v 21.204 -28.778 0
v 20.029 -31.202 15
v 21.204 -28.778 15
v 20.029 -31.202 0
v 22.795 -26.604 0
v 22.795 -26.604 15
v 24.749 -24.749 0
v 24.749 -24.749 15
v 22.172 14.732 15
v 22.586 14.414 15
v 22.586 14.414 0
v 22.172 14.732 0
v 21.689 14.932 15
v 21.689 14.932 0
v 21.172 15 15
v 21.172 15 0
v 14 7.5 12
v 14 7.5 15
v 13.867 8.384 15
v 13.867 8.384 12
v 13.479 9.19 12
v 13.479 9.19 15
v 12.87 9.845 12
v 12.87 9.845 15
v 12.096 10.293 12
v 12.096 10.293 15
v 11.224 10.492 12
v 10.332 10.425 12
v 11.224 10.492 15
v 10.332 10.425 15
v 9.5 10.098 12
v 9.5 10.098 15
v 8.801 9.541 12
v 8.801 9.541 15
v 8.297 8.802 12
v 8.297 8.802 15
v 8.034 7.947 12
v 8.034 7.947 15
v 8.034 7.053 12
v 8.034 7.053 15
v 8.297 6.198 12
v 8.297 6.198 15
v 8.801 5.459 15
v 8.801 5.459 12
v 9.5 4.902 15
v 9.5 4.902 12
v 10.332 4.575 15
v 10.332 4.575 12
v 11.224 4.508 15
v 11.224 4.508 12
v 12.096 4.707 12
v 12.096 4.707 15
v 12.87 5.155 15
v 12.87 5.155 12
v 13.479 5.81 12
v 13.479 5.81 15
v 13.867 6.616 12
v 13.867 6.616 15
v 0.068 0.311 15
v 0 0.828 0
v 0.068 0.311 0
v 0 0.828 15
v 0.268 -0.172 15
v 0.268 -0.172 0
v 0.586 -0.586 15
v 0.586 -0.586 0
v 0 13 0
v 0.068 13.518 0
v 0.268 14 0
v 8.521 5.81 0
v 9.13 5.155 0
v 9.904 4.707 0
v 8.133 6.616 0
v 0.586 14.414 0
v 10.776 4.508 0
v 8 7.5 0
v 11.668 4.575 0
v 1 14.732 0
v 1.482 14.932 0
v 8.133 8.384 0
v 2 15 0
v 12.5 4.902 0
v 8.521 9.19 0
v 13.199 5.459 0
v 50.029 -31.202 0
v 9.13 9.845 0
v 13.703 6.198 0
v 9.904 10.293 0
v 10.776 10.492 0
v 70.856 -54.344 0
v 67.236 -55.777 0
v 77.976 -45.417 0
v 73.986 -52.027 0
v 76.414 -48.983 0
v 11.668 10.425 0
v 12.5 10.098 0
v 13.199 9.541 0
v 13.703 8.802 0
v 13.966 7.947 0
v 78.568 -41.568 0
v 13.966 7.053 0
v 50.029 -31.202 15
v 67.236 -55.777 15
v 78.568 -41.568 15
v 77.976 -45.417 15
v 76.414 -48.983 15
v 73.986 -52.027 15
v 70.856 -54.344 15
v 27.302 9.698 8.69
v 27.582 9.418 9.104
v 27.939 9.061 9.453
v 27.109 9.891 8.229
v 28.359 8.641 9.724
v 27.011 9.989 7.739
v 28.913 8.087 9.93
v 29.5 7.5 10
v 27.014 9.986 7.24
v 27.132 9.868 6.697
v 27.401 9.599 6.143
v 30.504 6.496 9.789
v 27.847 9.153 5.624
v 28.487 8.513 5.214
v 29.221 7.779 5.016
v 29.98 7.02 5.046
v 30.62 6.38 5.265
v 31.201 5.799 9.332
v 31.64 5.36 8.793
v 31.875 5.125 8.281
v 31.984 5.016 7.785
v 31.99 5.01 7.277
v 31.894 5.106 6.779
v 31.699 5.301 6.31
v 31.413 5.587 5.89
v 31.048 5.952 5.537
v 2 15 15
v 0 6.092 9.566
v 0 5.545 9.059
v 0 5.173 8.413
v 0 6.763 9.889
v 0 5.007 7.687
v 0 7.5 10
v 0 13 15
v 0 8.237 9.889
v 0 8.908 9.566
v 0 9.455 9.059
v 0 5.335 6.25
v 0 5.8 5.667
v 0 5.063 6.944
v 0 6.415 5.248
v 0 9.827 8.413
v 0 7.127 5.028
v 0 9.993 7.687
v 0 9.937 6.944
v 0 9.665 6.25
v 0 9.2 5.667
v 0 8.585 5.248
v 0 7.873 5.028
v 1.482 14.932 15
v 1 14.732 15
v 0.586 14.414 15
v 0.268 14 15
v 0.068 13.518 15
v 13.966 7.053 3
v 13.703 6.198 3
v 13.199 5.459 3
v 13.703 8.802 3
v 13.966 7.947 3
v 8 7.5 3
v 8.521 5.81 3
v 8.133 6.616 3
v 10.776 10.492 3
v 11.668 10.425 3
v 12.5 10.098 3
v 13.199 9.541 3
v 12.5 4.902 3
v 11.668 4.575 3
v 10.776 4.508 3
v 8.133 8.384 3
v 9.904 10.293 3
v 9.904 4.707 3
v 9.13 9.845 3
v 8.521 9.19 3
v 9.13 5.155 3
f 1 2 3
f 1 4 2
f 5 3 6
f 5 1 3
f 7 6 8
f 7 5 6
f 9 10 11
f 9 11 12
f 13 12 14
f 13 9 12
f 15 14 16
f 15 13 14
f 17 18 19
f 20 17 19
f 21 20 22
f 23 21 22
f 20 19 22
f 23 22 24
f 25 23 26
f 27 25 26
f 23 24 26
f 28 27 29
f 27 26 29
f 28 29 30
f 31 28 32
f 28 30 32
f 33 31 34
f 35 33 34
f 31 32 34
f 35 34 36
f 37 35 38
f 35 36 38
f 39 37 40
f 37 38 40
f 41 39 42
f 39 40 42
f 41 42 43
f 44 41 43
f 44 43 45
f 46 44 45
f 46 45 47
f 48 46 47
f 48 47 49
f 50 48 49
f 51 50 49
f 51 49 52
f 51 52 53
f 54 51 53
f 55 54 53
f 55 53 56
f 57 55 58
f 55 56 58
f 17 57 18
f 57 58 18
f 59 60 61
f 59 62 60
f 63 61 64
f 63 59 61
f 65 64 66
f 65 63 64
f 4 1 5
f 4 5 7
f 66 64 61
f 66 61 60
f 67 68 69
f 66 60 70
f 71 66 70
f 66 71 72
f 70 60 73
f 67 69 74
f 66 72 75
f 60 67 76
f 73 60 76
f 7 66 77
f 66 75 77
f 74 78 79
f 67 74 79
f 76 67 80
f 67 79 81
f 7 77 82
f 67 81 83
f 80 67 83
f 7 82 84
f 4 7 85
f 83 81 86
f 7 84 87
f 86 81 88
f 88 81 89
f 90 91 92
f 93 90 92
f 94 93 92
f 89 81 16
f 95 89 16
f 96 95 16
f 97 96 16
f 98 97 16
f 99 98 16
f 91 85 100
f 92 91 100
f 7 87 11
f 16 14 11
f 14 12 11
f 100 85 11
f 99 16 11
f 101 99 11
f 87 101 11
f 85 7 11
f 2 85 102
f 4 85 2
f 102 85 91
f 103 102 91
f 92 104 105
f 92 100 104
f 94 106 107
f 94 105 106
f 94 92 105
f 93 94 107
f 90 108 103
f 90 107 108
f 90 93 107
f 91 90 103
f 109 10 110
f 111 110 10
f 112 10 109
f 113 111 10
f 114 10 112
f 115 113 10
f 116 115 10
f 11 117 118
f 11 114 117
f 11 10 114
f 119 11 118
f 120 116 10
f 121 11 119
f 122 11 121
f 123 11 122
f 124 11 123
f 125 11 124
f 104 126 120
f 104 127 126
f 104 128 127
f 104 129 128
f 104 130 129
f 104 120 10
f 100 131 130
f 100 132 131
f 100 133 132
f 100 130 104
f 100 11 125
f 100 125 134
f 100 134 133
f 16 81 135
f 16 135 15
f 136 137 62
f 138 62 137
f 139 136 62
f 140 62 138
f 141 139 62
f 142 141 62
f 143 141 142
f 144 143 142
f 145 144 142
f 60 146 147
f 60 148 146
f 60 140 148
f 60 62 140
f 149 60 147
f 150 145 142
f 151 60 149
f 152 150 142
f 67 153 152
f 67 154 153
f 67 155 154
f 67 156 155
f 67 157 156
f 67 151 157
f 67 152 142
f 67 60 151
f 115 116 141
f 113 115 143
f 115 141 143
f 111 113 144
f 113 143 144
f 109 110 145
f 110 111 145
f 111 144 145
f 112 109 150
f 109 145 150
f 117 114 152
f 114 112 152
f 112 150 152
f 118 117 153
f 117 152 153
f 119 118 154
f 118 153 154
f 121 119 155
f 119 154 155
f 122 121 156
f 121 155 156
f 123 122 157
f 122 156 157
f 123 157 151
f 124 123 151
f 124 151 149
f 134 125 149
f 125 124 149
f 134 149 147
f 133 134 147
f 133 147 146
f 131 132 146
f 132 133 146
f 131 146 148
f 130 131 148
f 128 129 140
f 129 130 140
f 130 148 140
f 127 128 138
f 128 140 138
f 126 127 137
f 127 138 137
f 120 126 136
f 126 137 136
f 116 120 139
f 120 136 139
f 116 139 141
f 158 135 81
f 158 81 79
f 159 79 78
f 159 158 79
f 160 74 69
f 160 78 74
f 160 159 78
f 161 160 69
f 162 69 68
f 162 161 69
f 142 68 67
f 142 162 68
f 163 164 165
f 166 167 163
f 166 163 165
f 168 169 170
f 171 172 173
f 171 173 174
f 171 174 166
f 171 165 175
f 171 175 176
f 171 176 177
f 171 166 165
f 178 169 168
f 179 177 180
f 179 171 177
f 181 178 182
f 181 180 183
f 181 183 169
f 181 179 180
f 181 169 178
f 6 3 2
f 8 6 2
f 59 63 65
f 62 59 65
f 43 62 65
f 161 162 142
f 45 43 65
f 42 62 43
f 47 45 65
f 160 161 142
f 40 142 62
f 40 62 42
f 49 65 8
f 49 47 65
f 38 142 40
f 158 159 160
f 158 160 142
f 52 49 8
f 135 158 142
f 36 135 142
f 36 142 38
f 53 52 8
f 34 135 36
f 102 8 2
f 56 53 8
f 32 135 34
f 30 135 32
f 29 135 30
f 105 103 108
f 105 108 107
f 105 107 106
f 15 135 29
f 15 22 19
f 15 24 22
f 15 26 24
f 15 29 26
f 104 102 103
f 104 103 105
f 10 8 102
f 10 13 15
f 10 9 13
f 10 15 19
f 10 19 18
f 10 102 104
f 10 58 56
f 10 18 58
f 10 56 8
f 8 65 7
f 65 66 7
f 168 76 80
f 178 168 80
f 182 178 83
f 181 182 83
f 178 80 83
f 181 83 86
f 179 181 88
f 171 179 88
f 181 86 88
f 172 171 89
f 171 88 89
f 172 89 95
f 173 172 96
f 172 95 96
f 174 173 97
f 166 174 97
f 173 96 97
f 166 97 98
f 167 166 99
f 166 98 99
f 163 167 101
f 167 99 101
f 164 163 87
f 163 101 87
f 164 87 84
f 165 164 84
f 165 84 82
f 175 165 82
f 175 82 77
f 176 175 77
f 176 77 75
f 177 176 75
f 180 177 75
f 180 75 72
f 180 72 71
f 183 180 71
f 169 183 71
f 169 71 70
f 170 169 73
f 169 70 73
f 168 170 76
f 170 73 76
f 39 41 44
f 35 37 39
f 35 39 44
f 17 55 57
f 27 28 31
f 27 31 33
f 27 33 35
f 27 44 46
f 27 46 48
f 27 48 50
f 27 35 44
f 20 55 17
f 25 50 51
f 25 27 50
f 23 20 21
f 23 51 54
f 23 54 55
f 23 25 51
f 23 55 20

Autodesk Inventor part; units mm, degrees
ref_plane "YZ Plane" through (0, 0, 0) normal (1, 0, 0) x (0, 1, 0)
ref_plane "XZ Plane" through (0, 0, 0) normal (0, 1, 0) x (-1, 0, 0)
ref_plane "XY Plane" through (0, 0, 0) normal (0, 0, 1) x (1, 0, 0)
sketch "Sketch1" plane through (0, 0, 0) normal (0, 0, 1) x (1, 0, 0)
  line L0 (0, 0) -> (0, 15)
  line L1 (0, 15) -> (22, 15)
  line L2 (22, 15) -> (78.5685, -41.5685)
  line L3 (0, 0) -> (24.7487, -24.7487)
  line L4 (0, 0) -> (35, 0) construction
  line L5 (0, 15) -> (0, 7.5) construction
  line L6 (11.1378, 7.6884) -> (50.0287, -31.2025) construction
  line L7 (11.1378, 7.6884) -> (66.1378, 7.6884) construction
  line L8 (50.0287, -31.2025) -> (67.2359, -55.777)
  line L9 (50.0287, -31.2025) -> (80.0287, -31.2025) construction
  line L10 (50.0287, -31.2025) -> (20.0287, -31.2025)
  arc A0 (24.7487, -24.7487) -> (20.0287, -31.2025) centre (34.0582, -36.5103) ccw
  arc A1 (67.2359, -55.777) -> (78.5685, -41.5685) centre (63.5723, -41.2313) ccw
  dimension "d0" = 15
  dimension "d1" = 22
  dimension "d2" = 80
  dimension "d3" = 135
  dimension "d4" = 35
  dimension "d5" = 45
  dimension "d6" = 55
  dimension "d7" = 45
  dimension "d8" = 30
  dimension "d9" = 55
  dimension "d10" = 30
  dimension "d11" = 15
  dimension "d12" = 15
extrude "Extrusion1" add sketch "Sketch1" along normal blind 15
sketch "Sketch2" plane through (0, 0, 0) normal (-1, 0, 0) x (0, 0, 1)
  line L0 (0, -41.5685) -> (0, 15) construction
  line L1 (0, 15) -> (7.5, 15) construction
  line L2 (0, 15) -> (15, 15) construction
  line L3 (7.5, 15) -> (7.5, 7.5) construction
  circle A0 centre (7.5, 7.5) radius 2.5
  point P0 (0, 0)
  dimension "d15" = 7.5
  dimension "d16" = 7.5
  dimension "d17" = 5
extrude "Extrusion2" cut sketch "Sketch2" against normal blind 33
fillet "Fillet1" radius 2 2 edges at (0, 15, 7.5) (0, 0, 7.5)
fillet "Fillet2" radius 2 1 edges at (22, 15, 7.5)
sketch "Sketch3" plane through (0, 0, 15) normal (0, 0, 1) x (1, 0, 0)
  line L0 (21.1716, 15) -> (2, 15) construction
  line L1 (6.35, 15) -> (6.35, 7.5) construction
  line L2 (0, 13) -> (0, 0.8284) construction
  line L3 (0, 7.5) -> (11, 7.5) construction
  line L4 (0, 7.5) -> (11, 7.5) construction
  circle A0 centre (11, 7.5) radius 3
  point P0 (0, 0)
  dimension "d22" = 7.5
  dimension "d23" = 11
  dimension "d24" = 0
  dimension "d25" = 6
extrude "Extrusion3" cut sketch "Sketch3" against normal blind 3
sketch "Sketch4" plane through (0, 0, 0) normal (0, 0, -1) x (-1, 0, 0)
  line L0 (-21.1716, 15) -> (-2, 15) construction
  line L1 (-4.7625, 15) -> (-4.7625, 7.5) construction
  line L2 (-4.7625, 15) -> (2.7375, 15) construction
  line L3 (0, 13) -> (0, 0.8284) construction
  line L4 (0, 7.5) -> (-11, 7.5) construction
  line L5 (0, 7.5) -> (11, 7.5) construction
  circle A0 centre (-11, 7.5) radius 3
  point P0 (0, 0)
  dimension "d28" = 7.5
  dimension "d29" = 90
  dimension "d30" = 11
  dimension "d31" = 180
  dimension "d32" = 6
extrude "Extrusion4" cut sketch "Sketch4" against normal blind 3
properties part number "Ramię ze szczękami" material "Steel"
